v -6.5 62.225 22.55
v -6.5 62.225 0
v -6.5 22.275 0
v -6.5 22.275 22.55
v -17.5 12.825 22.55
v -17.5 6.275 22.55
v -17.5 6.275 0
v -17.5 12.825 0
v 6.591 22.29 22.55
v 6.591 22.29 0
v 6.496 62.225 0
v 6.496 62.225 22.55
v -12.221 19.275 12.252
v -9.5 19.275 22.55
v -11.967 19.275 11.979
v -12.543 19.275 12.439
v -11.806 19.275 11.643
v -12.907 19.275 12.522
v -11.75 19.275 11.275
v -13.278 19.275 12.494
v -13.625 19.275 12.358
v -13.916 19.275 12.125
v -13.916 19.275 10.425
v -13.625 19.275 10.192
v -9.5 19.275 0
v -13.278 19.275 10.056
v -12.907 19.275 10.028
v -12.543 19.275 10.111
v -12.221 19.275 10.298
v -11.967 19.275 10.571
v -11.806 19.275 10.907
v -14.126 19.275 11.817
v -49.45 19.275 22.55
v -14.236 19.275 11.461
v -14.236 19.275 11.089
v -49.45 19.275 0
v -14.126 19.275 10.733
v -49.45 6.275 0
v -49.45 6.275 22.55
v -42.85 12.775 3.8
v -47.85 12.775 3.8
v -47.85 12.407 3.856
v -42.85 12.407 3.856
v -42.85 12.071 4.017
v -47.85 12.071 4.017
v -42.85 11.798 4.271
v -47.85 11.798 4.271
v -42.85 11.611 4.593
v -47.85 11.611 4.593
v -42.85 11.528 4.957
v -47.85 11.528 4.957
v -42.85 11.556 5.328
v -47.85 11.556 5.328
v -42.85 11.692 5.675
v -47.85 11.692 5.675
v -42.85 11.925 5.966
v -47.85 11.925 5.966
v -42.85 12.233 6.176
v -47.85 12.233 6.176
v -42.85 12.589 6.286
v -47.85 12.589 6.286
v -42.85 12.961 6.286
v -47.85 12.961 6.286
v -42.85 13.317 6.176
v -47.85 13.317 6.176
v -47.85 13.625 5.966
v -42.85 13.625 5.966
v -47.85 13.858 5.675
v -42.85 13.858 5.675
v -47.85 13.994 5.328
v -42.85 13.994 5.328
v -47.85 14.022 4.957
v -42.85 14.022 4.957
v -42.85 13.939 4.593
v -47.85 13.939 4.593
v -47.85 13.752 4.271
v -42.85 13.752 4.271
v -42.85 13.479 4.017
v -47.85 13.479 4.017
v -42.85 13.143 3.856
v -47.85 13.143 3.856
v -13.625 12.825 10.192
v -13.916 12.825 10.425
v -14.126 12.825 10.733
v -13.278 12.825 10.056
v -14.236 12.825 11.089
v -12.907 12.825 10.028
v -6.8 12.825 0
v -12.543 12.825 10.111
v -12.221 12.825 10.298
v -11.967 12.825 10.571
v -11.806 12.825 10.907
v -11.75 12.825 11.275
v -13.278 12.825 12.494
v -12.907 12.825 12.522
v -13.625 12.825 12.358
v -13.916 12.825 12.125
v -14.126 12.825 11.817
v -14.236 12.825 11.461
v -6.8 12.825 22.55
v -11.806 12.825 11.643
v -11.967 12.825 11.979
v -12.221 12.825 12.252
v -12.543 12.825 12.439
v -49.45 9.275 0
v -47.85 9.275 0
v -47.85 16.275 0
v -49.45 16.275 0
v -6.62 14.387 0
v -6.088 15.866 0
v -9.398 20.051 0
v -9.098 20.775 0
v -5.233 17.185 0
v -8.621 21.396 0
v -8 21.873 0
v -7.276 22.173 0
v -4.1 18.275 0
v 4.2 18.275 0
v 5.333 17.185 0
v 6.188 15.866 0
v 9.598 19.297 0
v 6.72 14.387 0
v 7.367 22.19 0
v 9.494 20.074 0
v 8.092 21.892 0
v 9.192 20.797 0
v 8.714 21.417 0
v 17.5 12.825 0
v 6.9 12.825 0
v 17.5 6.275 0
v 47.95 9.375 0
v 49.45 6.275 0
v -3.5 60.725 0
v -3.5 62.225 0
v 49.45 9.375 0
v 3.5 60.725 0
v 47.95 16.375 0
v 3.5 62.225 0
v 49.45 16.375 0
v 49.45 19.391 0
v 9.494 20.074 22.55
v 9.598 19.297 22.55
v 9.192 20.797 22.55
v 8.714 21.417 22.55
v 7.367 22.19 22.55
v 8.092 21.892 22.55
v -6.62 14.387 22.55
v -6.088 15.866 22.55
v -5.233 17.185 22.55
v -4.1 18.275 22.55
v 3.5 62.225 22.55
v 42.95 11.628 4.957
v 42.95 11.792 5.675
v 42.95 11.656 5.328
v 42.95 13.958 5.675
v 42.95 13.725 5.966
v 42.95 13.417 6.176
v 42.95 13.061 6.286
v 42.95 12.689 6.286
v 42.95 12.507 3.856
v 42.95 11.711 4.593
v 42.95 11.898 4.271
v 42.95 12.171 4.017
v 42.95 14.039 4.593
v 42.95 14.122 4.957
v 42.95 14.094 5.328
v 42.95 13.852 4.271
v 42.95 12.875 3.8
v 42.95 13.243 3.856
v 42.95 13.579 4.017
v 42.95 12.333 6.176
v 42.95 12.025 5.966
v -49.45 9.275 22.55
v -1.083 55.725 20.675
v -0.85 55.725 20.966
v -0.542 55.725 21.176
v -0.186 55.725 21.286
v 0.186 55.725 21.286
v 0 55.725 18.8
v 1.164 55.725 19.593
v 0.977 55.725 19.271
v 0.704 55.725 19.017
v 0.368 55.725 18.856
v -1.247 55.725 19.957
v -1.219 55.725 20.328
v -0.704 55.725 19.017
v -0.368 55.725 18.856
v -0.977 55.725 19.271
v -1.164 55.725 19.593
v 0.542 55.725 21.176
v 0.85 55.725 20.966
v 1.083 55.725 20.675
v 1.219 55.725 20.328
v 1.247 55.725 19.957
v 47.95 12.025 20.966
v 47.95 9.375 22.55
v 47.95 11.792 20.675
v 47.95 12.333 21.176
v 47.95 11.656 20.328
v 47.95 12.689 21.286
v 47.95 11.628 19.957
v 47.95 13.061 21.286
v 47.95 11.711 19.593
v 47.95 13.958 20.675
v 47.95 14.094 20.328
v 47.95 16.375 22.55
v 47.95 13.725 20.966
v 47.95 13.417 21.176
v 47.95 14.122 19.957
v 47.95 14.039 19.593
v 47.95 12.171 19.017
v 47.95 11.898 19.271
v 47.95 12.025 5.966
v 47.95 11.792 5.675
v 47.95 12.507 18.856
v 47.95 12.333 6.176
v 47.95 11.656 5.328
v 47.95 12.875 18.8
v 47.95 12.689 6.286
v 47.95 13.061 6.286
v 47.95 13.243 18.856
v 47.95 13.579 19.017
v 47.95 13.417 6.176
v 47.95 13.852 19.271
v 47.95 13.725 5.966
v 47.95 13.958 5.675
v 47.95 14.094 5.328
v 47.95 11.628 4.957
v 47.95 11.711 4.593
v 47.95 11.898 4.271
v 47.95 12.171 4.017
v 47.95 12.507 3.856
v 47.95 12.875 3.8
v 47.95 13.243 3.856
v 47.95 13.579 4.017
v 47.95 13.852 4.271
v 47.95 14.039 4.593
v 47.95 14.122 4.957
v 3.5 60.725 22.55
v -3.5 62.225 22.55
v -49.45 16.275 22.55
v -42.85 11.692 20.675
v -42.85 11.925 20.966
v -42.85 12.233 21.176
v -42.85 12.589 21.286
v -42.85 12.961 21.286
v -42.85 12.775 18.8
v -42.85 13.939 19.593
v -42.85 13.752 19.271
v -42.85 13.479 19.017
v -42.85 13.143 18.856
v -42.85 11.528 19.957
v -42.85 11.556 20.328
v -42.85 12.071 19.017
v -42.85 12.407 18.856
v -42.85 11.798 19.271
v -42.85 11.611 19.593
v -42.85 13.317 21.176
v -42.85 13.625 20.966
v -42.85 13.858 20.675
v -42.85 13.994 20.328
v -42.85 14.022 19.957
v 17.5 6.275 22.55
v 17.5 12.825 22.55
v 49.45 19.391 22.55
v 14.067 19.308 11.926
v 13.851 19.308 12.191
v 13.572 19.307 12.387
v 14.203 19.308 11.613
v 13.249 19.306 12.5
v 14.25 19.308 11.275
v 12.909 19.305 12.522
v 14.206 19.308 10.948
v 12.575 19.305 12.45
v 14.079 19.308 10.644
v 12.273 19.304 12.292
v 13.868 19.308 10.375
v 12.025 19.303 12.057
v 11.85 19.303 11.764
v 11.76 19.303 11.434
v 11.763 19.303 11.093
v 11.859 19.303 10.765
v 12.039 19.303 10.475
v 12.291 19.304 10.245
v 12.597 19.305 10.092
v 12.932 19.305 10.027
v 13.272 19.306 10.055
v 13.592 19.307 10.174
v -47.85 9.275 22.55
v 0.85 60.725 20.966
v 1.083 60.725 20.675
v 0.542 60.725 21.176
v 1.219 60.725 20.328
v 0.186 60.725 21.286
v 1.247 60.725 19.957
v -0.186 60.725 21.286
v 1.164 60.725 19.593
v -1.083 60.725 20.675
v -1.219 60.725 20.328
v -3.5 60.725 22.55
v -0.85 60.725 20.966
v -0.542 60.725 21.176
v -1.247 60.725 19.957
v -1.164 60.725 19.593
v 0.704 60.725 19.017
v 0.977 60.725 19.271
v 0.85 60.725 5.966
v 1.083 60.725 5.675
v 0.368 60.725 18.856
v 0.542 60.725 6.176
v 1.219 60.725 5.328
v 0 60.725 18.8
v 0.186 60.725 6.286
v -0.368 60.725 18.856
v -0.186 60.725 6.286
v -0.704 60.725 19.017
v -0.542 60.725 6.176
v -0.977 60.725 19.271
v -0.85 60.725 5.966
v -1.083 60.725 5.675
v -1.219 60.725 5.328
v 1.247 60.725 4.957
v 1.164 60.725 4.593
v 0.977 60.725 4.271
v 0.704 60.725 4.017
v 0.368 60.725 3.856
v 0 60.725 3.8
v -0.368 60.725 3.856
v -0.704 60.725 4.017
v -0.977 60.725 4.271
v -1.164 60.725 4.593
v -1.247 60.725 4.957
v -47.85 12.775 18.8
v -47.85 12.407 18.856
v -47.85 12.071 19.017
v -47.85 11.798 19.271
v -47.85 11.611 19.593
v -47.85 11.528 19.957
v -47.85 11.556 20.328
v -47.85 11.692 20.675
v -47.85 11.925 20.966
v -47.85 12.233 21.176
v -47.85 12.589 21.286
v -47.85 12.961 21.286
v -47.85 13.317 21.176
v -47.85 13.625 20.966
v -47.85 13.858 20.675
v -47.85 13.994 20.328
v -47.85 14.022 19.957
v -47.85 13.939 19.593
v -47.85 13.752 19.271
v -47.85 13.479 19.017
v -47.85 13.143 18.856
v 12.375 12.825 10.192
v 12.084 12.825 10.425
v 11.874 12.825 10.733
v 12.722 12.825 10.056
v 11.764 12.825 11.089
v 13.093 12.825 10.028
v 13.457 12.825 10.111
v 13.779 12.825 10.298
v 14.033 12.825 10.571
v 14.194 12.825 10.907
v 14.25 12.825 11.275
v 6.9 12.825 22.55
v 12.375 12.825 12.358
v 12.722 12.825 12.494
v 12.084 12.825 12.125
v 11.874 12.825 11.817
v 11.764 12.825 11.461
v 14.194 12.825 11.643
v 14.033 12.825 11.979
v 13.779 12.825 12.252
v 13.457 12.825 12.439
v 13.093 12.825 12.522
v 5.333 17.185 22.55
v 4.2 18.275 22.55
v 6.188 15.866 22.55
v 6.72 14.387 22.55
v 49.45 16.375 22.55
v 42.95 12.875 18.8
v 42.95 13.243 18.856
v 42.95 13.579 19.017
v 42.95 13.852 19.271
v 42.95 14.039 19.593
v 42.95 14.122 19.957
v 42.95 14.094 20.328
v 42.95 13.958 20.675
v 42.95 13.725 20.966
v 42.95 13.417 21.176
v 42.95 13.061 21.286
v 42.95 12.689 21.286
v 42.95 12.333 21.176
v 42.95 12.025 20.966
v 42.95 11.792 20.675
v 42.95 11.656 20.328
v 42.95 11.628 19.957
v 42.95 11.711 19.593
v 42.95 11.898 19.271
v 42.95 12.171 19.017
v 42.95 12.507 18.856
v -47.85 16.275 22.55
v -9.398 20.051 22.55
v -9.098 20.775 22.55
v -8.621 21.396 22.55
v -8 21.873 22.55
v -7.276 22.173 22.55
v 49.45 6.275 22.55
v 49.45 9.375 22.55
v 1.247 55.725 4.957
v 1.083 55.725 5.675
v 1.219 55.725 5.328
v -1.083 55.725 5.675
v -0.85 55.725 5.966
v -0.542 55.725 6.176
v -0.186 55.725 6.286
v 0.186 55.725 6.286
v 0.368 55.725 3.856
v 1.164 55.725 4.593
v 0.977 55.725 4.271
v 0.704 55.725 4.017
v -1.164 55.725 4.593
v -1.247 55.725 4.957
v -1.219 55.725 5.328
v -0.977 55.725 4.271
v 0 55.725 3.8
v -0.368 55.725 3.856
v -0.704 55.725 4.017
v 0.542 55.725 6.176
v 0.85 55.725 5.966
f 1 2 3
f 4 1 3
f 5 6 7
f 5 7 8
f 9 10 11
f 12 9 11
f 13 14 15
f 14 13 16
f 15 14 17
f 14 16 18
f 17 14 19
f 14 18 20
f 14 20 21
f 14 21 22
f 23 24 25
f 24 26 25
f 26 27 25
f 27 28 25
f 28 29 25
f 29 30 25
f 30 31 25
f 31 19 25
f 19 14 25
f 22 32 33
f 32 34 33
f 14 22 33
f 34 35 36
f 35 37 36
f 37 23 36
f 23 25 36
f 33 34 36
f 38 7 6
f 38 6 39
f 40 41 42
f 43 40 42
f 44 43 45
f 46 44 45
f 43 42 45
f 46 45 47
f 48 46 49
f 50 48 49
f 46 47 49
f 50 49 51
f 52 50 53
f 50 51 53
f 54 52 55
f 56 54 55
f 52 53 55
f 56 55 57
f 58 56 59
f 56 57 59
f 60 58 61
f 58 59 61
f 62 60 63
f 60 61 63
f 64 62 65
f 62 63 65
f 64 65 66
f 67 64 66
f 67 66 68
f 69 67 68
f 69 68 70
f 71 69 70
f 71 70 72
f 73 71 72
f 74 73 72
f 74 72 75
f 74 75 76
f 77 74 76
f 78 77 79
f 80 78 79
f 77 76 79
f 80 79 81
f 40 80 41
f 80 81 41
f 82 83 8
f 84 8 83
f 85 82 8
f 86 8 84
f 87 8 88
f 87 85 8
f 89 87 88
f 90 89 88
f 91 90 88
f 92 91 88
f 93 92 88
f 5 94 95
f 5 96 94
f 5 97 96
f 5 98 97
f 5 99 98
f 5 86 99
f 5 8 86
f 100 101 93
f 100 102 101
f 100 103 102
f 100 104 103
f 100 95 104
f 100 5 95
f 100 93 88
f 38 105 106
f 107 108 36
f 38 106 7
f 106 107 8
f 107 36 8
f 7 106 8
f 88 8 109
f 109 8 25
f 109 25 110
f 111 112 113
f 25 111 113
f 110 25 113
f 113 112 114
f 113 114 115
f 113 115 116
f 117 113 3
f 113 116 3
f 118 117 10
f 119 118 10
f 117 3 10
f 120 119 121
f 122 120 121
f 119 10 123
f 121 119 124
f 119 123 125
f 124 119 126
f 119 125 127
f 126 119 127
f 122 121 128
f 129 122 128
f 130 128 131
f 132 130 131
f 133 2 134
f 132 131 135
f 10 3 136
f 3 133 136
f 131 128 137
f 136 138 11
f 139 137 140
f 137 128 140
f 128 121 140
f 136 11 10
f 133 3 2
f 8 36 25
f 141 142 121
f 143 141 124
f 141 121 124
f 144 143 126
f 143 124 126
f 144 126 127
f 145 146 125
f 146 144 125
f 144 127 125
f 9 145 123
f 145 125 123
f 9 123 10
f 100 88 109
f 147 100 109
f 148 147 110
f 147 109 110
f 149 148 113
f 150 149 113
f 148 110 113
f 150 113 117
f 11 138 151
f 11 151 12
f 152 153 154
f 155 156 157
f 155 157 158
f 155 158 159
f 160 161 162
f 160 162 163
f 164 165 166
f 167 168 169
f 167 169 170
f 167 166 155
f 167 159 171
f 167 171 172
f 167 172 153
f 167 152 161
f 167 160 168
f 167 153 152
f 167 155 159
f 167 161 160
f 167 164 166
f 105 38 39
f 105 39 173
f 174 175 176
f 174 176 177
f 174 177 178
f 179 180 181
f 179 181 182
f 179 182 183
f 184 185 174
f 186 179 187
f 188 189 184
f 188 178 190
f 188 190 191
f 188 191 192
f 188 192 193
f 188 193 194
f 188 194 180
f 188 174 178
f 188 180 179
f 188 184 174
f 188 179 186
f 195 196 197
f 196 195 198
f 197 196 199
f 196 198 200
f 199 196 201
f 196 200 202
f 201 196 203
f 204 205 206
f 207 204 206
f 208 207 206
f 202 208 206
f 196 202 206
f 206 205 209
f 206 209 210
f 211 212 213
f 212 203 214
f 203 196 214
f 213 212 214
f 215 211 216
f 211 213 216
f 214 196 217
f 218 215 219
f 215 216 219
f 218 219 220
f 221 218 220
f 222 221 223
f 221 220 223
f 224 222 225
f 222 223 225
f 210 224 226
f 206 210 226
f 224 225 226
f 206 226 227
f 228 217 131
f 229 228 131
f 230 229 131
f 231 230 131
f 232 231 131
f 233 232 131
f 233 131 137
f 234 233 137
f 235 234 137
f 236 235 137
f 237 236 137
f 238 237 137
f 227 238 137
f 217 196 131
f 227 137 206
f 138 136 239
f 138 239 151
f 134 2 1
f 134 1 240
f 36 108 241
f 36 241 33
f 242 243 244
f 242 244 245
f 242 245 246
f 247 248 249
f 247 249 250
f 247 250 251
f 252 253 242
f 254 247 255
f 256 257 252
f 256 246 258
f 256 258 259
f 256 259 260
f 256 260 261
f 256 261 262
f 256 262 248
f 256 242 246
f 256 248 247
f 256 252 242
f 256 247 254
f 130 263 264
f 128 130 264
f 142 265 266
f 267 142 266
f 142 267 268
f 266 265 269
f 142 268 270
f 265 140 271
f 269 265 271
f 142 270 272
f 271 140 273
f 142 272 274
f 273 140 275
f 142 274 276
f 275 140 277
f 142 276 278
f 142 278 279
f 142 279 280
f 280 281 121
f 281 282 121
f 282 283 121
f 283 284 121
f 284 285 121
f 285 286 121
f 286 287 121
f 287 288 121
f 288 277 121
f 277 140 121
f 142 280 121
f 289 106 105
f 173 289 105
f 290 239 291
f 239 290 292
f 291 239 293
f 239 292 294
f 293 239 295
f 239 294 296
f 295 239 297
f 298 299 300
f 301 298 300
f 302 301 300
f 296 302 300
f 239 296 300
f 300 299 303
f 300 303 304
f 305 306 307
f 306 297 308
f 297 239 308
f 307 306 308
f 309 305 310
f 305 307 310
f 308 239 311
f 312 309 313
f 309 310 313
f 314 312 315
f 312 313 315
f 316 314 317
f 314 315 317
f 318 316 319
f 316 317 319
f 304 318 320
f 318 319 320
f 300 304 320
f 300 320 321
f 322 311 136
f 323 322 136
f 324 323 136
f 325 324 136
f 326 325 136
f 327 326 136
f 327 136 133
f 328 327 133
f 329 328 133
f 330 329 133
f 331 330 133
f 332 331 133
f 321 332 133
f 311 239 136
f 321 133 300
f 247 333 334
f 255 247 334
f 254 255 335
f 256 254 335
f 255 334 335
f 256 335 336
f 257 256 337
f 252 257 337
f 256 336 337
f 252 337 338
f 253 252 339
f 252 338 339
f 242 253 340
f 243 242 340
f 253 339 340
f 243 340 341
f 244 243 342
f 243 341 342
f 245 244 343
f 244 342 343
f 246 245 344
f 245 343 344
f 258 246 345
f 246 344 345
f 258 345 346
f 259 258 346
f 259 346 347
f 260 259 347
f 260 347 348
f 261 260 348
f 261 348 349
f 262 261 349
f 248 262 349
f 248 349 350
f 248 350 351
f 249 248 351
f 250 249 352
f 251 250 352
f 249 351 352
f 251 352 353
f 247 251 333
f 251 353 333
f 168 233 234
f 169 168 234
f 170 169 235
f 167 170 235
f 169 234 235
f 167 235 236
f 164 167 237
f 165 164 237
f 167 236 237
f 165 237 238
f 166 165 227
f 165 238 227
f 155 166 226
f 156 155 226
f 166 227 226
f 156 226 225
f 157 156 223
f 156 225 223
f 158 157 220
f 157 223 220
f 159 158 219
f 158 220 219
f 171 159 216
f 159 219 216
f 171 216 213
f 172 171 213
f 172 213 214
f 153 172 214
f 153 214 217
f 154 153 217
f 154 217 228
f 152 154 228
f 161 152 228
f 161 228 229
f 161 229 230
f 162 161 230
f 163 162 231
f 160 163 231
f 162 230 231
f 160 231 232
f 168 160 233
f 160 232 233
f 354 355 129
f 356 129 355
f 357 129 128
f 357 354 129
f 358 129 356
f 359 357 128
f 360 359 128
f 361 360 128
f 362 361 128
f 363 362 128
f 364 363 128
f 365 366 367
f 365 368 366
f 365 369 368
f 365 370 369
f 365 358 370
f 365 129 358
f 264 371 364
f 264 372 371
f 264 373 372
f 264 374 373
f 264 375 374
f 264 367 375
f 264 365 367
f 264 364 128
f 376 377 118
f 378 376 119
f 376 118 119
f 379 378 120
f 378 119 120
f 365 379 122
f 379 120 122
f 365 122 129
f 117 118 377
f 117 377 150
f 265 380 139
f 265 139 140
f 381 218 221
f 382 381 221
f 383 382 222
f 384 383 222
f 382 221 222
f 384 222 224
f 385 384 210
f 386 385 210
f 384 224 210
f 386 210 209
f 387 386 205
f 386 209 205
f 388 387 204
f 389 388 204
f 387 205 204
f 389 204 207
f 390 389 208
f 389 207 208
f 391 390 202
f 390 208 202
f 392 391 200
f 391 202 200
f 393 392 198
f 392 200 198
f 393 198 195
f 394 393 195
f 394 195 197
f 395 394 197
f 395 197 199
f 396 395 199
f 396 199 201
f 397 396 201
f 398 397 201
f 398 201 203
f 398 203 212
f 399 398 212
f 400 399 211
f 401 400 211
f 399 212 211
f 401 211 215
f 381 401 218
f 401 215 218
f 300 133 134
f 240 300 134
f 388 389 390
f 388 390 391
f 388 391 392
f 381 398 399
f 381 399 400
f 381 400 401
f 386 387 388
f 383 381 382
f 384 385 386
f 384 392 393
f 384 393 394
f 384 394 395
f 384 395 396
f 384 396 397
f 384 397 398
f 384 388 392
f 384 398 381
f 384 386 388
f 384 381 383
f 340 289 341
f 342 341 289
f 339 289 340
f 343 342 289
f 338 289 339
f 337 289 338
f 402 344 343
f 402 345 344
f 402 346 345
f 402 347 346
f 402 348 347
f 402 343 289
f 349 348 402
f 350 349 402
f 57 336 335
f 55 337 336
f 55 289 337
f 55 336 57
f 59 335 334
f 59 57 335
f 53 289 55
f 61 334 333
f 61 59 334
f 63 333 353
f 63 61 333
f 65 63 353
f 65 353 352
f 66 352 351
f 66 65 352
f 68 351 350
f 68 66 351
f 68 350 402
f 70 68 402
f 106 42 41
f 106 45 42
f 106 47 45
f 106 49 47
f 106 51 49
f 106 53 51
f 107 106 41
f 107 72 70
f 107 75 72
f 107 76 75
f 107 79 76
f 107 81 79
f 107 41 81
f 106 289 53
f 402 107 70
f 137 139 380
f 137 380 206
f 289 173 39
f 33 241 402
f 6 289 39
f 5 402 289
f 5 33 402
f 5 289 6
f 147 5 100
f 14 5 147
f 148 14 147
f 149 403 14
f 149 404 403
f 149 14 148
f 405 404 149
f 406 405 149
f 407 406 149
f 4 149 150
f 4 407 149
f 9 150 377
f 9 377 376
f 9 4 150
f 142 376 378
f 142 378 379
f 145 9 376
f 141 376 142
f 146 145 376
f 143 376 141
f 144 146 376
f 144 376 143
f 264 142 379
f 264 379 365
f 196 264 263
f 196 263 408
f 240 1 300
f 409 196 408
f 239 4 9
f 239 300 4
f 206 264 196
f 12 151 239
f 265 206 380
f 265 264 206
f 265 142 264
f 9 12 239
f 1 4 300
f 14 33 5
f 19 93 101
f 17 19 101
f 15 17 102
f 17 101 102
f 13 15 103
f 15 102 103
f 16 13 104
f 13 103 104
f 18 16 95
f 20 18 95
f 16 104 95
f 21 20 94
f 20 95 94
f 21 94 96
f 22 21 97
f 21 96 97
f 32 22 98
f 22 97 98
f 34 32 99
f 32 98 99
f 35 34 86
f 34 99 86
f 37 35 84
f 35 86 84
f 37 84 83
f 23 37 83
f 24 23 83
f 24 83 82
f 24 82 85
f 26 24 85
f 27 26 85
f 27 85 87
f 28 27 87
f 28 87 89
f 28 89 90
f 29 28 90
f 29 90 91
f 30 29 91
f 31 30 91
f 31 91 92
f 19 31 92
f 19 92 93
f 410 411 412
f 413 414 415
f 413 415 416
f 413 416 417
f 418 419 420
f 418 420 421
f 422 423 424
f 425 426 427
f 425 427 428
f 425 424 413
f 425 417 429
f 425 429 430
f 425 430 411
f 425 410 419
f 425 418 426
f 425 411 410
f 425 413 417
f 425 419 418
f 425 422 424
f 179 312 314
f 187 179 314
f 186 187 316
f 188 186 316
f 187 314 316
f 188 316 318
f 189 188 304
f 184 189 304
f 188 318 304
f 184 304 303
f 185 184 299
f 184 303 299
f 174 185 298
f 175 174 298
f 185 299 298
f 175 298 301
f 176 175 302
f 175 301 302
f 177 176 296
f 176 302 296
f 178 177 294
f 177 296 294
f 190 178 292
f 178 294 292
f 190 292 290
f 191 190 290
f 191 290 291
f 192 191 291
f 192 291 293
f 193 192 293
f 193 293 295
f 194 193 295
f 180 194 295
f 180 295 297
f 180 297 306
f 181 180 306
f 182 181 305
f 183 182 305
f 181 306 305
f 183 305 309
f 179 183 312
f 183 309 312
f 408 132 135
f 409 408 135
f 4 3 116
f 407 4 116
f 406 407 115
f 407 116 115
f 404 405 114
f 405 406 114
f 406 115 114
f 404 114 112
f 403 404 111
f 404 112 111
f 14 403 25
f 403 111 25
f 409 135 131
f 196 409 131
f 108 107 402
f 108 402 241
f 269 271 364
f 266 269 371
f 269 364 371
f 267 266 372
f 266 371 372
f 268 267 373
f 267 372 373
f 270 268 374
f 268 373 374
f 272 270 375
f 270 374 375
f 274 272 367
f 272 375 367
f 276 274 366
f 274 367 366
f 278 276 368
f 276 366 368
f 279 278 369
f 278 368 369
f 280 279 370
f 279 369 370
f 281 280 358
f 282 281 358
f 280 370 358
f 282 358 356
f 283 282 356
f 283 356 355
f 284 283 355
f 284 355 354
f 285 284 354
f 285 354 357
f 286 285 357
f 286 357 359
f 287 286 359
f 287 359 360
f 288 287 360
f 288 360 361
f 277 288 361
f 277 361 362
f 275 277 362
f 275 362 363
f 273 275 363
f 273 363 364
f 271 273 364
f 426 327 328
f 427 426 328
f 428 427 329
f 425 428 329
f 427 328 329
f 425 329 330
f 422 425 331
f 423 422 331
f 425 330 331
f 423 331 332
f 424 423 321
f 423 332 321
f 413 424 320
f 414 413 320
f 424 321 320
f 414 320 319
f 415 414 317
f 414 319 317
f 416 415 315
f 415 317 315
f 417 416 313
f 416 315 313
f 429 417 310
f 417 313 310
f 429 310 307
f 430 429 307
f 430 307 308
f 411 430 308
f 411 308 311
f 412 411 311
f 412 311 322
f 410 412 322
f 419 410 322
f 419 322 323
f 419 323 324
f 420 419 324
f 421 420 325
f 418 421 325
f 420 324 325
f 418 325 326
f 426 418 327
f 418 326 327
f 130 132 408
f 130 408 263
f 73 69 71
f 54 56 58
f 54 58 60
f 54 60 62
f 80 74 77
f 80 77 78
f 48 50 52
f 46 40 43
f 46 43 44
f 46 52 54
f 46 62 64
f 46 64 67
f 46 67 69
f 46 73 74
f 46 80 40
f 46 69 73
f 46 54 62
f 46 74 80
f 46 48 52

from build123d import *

# Parameters (mm, degrees)
SKETCH1_W          = 98.9
SKETCH1_H          = 124.45
BODY_DEPTH         = 22.55
SKETCH4_W          = 7
SKETCH4_H          = 3
SKETCH4_W_2        = 3
SKETCH4_H_2        = 7
CUT_EXTRUDE1_DEPTH = 63
SKETCH5_W          = 8.299397568
SKETCH5_H          = 10.9
CUT_EXTRUDE2_DEPTH = 63
SKETCH6_W          = 98.9
SKETCH6_H          = 68.5
CUT_EXTRUDE3_DEPTH = 63
SKETCH7_W          = 22.55
SKETCH7_H          = 1.441759006
CUT_EXTRUDE4_DEPTH = 63
SKETCH8_W          = 35
SKETCH8_H          = 13.1
CUT_EXTRUDE5_DEPTH = 23.55
SKETCH9_R          = 1.25
CUT_EXTRUDE6_DEPTH = 10
SKETCH10_R         = 1.25
CUT_EXTRUDE7_DEPTH = 5
CIRPATTERN1_COUNT  = 4


with BuildPart() as part:
    # Sketch1 → body (new body)
    with BuildSketch(Plane.XY):
        Rectangle(SKETCH1_W, SKETCH1_H)
    extrude(amount=BODY_DEPTH)

    # Sketch4 → Cut-Extrude1 (cut)
    with BuildSketch(Plane(origin=(0, 0, 0), x_dir=(-1, 0, 0), z_dir=(0, 0, -1))):
        with Locations((0, 62.225)):
            Rectangle(SKETCH4_W, SKETCH4_H)
        with Locations((49.35, 12.775)):
            Rectangle(SKETCH4_W_2, SKETCH4_H_2)
        with Locations((-49.45, 12.875)):
            Rectangle(SKETCH4_W_2, SKETCH4_H_2)
    extrude(amount=-CUT_EXTRUDE1_DEPTH, mode=Mode.SUBTRACT)

    # Sketch5 → Cut-Extrude2 (cut)
    with BuildSketch(Plane(origin=(0, 0, 0), x_dir=(-1, 0, 0), z_dir=(0, 0, -1))):
        with Locations((-0.05, 12.825)):
            Rectangle(SKETCH5_W, SKETCH5_H)
        with BuildLine():
            Line((4.099698784, 18.275), (4.099698784, 7.375))
            ThreePointArc((4.099698784, 7.375), (6.087912376, 9.783860137), (6.8, 12.825))
            ThreePointArc((6.8, 12.825), (6.087912376, 15.866139863), (4.099698784, 18.275))
        make_face()
        with BuildLine():
            ThreePointArc((-4.199698784, 18.275), (-6.9, 12.825), (-4.199698784, 7.375))
            Line((-4.199698784, 7.375), (-4.199698784, 18.275))
        make_face()
    extrude(amount=-CUT_EXTRUDE2_DEPTH, mode=Mode.SUBTRACT)

    # Sketch6 → Cut-Extrude3 (cut)
    with BuildSketch(Plane(origin=(0, 0, 0), x_dir=(-1, 0, 0), z_dir=(0, 0, -1))):
        with BuildLine():
            Line((49.45, 19.275), (49.45, 62.225))
            Line((49.45, 62.225), (6.5, 62.225))
            Line((6.5, 62.225), (6.5, 22.275))
            ThreePointArc((6.5, 22.275), (8.621320344, 21.396320344), (9.5, 19.275))
            Line((9.5, 19.275), (49.45, 19.275))
        make_face()
        with BuildLine():
            Line((-49.45, 60.783244994), (-49.45, 19.391375139))
            Line((-49.45, 19.391375139), (-9.597617792, 19.297494249))
            ThreePointArc((-9.597617792, 19.297494249), (-8.71394336, 21.416738793), (-6.590558988, 22.290418797))
            Line((-6.590558988, 22.290418797), (-6.496484462, 62.225))
            Line((-6.496484462, 62.225), (-49.446603635, 62.225))
            Line((-49.446603635, 62.225), (-49.45, 60.783244994))
        make_face()
        with Locations((0, -27.975)):
            Rectangle(SKETCH6_W, SKETCH6_H)
    extrude(amount=-CUT_EXTRUDE3_DEPTH, mode=Mode.SUBTRACT)

    # Sketch7 → Cut-Extrude4 (cut)
    with BuildSketch(Plane(origin=(49.592912844, 0.116826812, 0), x_dir=(0, 0, 1), z_dir=(-0.999997225, -0.002355709, 0))):
        with Locations((11.275, 61.387466016)):
            Rectangle(SKETCH7_W, SKETCH7_H)
    extrude(amount=-CUT_EXTRUDE4_DEPTH, mode=Mode.SUBTRACT)

    # Sketch8 → Cut-Extrude5 (cut, through all)
    with BuildSketch(Plane.XY.offset(22.55)):
        with Locations((0, 6.275)):
            Rectangle(SKETCH8_W, SKETCH8_H)
    extrude(amount=-CUT_EXTRUDE5_DEPTH, mode=Mode.SUBTRACT)

    # Sketch9 → Cut-Extrude6 (cut)
    with BuildSketch(Plane.XZ.offset(-12.825)):
        with Locations((13, 11.275)):
            Circle(SKETCH9_R)
        with Locations((-13, 11.275)):
            Circle(SKETCH9_R)
    extrude(amount=-CUT_EXTRUDE6_DEPTH, mode=Mode.SUBTRACT)

    # Sketch10 → Cut-Extrude7 (cut)
    with BuildSketch(Plane(origin=(47.95, 0, 0), x_dir=(0, 0, -1), z_dir=(1, 0, 0))):
        with Locations((-20.05, 12.875)):
            Circle(SKETCH10_R)
        with Locations((-5.05, 12.875)):
            Circle(SKETCH10_R)
    cut_extrude7 = extrude(amount=-CUT_EXTRUDE7_DEPTH, mode=Mode.SUBTRACT)

    # CirPattern1: Cut-Extrude7 ×4 about axis
    cirpattern1_axis = Axis((0.05, 12.825, 0), (0, 0, 1))
    for i in range(1, CIRPATTERN1_COUNT):
        add(cut_extrude7.rotate(cirpattern1_axis, i * 360 / CIRPATTERN1_COUNT), mode=Mode.SUBTRACT)


solid = part.part
